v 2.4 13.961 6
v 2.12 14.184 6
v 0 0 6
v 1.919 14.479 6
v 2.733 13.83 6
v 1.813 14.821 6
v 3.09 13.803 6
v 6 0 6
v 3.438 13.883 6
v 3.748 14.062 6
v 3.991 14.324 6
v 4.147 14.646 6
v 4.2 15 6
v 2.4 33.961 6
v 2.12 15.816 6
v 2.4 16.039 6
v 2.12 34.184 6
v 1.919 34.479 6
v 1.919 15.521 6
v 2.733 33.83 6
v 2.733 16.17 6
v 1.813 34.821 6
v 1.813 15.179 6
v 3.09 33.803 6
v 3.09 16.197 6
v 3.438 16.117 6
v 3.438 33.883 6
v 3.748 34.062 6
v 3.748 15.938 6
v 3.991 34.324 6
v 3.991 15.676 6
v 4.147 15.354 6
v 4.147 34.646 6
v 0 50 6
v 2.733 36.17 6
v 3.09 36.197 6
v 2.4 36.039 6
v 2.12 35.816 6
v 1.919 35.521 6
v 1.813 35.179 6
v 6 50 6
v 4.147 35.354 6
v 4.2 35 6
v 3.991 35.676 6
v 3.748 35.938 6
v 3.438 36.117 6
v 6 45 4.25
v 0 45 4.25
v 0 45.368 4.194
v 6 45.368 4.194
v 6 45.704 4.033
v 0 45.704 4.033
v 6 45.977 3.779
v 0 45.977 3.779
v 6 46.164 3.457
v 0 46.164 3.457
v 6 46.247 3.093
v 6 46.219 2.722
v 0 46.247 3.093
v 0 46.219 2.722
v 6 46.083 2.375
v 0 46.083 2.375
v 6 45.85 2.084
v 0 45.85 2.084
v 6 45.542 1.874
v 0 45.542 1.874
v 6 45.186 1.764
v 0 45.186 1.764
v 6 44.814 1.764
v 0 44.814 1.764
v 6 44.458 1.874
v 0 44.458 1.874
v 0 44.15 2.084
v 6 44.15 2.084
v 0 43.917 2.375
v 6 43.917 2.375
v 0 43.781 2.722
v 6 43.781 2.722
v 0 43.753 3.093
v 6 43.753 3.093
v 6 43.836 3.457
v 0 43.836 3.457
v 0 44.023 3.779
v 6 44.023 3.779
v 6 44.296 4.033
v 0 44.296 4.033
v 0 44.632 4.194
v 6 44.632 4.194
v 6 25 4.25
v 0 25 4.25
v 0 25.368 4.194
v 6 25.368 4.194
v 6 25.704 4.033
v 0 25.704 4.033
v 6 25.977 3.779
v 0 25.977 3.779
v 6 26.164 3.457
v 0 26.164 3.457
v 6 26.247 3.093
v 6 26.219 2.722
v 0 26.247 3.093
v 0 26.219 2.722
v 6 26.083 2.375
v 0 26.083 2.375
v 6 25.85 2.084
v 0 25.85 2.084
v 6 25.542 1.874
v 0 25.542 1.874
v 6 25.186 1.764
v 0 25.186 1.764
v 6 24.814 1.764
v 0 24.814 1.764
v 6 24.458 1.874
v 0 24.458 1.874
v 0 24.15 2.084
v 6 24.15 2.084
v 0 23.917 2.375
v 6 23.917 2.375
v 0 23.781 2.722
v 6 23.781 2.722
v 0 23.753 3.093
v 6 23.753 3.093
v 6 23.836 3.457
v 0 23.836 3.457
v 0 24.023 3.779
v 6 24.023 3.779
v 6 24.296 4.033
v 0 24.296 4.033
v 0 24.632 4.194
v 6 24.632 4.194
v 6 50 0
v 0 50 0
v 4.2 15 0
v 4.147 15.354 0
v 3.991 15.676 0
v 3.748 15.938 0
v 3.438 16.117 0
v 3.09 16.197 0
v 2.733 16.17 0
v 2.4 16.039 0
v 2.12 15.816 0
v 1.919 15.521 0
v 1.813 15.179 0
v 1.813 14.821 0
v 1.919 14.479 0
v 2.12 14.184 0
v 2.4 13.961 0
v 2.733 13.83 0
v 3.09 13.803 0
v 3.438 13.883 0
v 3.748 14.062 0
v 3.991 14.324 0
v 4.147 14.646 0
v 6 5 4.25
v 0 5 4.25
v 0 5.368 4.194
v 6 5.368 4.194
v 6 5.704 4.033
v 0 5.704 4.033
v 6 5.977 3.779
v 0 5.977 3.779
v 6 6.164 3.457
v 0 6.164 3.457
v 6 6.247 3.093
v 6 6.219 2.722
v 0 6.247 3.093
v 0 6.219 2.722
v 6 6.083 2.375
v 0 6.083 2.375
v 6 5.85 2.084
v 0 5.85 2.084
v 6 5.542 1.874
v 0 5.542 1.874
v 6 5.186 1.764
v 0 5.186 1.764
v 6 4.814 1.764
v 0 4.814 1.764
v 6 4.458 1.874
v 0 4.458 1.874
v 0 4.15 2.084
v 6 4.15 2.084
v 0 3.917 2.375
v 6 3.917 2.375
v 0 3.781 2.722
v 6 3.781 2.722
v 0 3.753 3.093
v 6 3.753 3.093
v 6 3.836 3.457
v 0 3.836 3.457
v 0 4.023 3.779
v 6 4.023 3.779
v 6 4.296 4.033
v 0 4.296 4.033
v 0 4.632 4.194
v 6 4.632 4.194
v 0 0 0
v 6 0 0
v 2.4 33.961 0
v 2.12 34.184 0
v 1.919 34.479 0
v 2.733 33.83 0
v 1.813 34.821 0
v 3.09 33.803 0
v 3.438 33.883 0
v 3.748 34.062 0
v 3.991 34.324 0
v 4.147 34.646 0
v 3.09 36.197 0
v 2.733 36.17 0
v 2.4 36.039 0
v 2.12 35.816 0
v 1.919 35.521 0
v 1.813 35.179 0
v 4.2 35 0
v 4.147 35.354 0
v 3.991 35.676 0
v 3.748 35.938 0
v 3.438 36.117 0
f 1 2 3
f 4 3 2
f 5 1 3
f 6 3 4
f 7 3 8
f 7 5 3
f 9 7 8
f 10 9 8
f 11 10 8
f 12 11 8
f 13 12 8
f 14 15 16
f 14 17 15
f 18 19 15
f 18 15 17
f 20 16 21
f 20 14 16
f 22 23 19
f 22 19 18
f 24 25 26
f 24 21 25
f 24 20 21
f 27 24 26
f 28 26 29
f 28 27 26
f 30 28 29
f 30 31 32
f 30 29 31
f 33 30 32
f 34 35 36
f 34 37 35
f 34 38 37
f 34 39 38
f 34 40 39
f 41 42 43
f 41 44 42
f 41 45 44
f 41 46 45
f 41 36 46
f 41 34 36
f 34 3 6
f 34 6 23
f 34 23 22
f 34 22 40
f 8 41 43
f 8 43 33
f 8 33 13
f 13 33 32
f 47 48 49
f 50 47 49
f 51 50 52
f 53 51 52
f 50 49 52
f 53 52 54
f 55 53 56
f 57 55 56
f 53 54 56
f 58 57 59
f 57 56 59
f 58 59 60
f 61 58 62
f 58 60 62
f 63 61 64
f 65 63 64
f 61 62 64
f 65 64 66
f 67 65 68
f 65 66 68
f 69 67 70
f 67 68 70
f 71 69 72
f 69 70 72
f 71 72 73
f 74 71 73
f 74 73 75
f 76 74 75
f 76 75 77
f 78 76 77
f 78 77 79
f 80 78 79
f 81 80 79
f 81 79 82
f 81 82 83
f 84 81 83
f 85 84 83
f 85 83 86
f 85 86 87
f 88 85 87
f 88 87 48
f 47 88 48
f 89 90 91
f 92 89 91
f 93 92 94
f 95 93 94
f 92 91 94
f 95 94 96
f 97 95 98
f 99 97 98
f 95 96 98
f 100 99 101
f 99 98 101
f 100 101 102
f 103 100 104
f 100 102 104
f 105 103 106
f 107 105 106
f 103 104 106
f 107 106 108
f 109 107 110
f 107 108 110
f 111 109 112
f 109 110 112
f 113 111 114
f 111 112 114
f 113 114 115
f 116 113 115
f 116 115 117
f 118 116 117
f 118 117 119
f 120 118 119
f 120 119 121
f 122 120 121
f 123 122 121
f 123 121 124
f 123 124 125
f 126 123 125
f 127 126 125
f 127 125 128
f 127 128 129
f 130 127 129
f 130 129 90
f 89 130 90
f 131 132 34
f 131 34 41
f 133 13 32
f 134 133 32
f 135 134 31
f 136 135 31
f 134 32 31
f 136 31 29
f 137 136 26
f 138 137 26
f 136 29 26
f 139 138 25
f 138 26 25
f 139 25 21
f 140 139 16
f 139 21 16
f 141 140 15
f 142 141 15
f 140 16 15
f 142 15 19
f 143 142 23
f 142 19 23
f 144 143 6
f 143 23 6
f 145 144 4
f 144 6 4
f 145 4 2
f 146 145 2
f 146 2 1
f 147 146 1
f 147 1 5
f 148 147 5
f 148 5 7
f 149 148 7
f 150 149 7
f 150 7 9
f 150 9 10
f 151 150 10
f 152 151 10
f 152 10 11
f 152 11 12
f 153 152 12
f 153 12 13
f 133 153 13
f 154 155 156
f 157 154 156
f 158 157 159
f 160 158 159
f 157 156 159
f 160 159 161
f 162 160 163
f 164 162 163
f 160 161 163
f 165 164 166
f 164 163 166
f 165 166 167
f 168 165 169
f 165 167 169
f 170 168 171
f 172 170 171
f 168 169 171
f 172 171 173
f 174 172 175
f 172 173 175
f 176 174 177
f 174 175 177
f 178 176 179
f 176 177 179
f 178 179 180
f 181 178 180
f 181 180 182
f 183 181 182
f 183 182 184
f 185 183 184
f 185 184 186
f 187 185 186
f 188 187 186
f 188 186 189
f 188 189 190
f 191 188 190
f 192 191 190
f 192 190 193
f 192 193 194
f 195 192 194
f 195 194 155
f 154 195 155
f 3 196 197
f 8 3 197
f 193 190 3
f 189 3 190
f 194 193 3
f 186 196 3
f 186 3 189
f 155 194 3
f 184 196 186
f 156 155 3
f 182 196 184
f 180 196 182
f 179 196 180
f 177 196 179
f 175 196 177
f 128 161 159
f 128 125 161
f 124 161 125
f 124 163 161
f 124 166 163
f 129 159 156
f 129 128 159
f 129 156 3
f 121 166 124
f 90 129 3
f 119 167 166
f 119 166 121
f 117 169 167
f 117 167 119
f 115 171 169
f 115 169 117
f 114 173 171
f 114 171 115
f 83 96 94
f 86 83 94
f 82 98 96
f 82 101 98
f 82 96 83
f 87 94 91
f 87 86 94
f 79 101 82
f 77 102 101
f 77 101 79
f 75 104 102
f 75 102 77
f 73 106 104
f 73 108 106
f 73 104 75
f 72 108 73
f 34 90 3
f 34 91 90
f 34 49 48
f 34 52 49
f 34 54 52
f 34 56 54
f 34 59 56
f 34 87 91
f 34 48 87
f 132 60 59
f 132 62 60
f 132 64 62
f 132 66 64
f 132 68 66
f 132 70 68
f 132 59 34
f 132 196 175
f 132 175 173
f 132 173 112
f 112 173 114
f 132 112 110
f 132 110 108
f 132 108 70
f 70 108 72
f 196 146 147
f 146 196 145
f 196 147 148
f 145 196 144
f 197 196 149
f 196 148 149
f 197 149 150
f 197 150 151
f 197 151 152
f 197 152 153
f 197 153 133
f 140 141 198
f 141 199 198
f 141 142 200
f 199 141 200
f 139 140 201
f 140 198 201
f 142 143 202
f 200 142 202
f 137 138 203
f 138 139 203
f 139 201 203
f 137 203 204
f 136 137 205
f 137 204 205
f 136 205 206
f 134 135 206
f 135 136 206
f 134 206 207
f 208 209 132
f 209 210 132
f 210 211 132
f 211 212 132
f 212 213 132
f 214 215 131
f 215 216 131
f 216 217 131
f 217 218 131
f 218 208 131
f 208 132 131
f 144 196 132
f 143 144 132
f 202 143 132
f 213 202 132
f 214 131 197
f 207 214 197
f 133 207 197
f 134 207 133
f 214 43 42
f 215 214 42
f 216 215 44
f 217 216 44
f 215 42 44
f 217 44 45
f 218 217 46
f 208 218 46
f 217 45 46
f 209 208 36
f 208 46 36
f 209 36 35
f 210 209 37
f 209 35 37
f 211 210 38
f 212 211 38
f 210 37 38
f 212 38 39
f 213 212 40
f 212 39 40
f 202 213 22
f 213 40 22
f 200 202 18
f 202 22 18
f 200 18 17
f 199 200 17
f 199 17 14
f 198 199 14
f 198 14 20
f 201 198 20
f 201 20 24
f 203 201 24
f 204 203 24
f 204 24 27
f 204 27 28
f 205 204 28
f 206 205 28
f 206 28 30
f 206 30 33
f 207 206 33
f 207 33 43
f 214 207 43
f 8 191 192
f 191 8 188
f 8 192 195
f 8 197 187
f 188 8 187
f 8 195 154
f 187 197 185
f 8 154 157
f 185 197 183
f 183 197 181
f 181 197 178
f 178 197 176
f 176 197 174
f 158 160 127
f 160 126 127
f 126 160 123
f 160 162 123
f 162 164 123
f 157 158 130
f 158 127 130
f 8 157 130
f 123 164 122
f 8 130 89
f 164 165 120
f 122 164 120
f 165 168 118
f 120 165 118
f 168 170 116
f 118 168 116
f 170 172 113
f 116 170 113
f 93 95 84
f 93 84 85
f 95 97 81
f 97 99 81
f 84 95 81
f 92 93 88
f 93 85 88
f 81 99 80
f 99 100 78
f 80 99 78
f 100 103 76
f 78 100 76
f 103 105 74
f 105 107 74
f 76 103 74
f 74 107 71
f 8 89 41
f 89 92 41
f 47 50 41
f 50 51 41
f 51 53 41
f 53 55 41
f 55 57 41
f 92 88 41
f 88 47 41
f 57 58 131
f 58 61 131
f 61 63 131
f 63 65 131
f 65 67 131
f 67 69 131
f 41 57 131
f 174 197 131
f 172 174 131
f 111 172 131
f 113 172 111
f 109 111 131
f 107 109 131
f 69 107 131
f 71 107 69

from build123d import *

# Parameters (mm, degrees)
SKETCH_1_W          = 6
SKETCH_1_H          = 70
EXTRUDE_1_DEPTH     = 6
SKETCH_4_R          = 1.25
CUT_EXTRUDE_3_DEPTH = 8
SKETCH_6_R          = 1.2
CUT_EXTRUDE_5_DEPTH = 10
SKETCH_7_W          = 6
SKETCH_7_H          = 6
CUT_EXTRUDE_6_DEPTH = 20


with BuildPart() as part:
    # 草图1 → 凸台-拉伸1 (new body)
    with BuildSketch(Plane.XY):
        with Locations((3, 35)):
            Rectangle(SKETCH_1_W, SKETCH_1_H)
    extrude(amount=EXTRUDE_1_DEPTH)

    # 草图4 → 切除-拉伸3 (cut)
    with BuildSketch(Plane.ZY):
        with Locations((3, 65)):
            Circle(SKETCH_4_R)
        with Locations((3, 45)):
            Circle(SKETCH_4_R)
        with Locations((3, 25)):
            Circle(SKETCH_4_R)
        with Locations((3, 5)):
            Circle(SKETCH_4_R)
    extrude(amount=-CUT_EXTRUDE_3_DEPTH, mode=Mode.SUBTRACT)

    # 草图6 → 切除-拉伸5 (cut)
    with BuildSketch(Plane.XY.offset(6)):
        with Locations((3, 15)):
            Circle(SKETCH_6_R)
        with Locations((3, 35)):
            Circle(SKETCH_6_R)
        with Locations((3, 55)):
            Circle(SKETCH_6_R)
    extrude(amount=-CUT_EXTRUDE_5_DEPTH, mode=Mode.SUBTRACT)

    # 草图7 → 切除-拉伸6 (cut)
    with BuildSketch(Plane(origin=(0, 70, 0), x_dir=(1, 0, 0), z_dir=(0, 1, 0))):
        with Locations((3, -3)):
            Rectangle(SKETCH_7_W, SKETCH_7_H)
    extrude(amount=-CUT_EXTRUDE_6_DEPTH, mode=Mode.SUBTRACT)


solid = part.part
